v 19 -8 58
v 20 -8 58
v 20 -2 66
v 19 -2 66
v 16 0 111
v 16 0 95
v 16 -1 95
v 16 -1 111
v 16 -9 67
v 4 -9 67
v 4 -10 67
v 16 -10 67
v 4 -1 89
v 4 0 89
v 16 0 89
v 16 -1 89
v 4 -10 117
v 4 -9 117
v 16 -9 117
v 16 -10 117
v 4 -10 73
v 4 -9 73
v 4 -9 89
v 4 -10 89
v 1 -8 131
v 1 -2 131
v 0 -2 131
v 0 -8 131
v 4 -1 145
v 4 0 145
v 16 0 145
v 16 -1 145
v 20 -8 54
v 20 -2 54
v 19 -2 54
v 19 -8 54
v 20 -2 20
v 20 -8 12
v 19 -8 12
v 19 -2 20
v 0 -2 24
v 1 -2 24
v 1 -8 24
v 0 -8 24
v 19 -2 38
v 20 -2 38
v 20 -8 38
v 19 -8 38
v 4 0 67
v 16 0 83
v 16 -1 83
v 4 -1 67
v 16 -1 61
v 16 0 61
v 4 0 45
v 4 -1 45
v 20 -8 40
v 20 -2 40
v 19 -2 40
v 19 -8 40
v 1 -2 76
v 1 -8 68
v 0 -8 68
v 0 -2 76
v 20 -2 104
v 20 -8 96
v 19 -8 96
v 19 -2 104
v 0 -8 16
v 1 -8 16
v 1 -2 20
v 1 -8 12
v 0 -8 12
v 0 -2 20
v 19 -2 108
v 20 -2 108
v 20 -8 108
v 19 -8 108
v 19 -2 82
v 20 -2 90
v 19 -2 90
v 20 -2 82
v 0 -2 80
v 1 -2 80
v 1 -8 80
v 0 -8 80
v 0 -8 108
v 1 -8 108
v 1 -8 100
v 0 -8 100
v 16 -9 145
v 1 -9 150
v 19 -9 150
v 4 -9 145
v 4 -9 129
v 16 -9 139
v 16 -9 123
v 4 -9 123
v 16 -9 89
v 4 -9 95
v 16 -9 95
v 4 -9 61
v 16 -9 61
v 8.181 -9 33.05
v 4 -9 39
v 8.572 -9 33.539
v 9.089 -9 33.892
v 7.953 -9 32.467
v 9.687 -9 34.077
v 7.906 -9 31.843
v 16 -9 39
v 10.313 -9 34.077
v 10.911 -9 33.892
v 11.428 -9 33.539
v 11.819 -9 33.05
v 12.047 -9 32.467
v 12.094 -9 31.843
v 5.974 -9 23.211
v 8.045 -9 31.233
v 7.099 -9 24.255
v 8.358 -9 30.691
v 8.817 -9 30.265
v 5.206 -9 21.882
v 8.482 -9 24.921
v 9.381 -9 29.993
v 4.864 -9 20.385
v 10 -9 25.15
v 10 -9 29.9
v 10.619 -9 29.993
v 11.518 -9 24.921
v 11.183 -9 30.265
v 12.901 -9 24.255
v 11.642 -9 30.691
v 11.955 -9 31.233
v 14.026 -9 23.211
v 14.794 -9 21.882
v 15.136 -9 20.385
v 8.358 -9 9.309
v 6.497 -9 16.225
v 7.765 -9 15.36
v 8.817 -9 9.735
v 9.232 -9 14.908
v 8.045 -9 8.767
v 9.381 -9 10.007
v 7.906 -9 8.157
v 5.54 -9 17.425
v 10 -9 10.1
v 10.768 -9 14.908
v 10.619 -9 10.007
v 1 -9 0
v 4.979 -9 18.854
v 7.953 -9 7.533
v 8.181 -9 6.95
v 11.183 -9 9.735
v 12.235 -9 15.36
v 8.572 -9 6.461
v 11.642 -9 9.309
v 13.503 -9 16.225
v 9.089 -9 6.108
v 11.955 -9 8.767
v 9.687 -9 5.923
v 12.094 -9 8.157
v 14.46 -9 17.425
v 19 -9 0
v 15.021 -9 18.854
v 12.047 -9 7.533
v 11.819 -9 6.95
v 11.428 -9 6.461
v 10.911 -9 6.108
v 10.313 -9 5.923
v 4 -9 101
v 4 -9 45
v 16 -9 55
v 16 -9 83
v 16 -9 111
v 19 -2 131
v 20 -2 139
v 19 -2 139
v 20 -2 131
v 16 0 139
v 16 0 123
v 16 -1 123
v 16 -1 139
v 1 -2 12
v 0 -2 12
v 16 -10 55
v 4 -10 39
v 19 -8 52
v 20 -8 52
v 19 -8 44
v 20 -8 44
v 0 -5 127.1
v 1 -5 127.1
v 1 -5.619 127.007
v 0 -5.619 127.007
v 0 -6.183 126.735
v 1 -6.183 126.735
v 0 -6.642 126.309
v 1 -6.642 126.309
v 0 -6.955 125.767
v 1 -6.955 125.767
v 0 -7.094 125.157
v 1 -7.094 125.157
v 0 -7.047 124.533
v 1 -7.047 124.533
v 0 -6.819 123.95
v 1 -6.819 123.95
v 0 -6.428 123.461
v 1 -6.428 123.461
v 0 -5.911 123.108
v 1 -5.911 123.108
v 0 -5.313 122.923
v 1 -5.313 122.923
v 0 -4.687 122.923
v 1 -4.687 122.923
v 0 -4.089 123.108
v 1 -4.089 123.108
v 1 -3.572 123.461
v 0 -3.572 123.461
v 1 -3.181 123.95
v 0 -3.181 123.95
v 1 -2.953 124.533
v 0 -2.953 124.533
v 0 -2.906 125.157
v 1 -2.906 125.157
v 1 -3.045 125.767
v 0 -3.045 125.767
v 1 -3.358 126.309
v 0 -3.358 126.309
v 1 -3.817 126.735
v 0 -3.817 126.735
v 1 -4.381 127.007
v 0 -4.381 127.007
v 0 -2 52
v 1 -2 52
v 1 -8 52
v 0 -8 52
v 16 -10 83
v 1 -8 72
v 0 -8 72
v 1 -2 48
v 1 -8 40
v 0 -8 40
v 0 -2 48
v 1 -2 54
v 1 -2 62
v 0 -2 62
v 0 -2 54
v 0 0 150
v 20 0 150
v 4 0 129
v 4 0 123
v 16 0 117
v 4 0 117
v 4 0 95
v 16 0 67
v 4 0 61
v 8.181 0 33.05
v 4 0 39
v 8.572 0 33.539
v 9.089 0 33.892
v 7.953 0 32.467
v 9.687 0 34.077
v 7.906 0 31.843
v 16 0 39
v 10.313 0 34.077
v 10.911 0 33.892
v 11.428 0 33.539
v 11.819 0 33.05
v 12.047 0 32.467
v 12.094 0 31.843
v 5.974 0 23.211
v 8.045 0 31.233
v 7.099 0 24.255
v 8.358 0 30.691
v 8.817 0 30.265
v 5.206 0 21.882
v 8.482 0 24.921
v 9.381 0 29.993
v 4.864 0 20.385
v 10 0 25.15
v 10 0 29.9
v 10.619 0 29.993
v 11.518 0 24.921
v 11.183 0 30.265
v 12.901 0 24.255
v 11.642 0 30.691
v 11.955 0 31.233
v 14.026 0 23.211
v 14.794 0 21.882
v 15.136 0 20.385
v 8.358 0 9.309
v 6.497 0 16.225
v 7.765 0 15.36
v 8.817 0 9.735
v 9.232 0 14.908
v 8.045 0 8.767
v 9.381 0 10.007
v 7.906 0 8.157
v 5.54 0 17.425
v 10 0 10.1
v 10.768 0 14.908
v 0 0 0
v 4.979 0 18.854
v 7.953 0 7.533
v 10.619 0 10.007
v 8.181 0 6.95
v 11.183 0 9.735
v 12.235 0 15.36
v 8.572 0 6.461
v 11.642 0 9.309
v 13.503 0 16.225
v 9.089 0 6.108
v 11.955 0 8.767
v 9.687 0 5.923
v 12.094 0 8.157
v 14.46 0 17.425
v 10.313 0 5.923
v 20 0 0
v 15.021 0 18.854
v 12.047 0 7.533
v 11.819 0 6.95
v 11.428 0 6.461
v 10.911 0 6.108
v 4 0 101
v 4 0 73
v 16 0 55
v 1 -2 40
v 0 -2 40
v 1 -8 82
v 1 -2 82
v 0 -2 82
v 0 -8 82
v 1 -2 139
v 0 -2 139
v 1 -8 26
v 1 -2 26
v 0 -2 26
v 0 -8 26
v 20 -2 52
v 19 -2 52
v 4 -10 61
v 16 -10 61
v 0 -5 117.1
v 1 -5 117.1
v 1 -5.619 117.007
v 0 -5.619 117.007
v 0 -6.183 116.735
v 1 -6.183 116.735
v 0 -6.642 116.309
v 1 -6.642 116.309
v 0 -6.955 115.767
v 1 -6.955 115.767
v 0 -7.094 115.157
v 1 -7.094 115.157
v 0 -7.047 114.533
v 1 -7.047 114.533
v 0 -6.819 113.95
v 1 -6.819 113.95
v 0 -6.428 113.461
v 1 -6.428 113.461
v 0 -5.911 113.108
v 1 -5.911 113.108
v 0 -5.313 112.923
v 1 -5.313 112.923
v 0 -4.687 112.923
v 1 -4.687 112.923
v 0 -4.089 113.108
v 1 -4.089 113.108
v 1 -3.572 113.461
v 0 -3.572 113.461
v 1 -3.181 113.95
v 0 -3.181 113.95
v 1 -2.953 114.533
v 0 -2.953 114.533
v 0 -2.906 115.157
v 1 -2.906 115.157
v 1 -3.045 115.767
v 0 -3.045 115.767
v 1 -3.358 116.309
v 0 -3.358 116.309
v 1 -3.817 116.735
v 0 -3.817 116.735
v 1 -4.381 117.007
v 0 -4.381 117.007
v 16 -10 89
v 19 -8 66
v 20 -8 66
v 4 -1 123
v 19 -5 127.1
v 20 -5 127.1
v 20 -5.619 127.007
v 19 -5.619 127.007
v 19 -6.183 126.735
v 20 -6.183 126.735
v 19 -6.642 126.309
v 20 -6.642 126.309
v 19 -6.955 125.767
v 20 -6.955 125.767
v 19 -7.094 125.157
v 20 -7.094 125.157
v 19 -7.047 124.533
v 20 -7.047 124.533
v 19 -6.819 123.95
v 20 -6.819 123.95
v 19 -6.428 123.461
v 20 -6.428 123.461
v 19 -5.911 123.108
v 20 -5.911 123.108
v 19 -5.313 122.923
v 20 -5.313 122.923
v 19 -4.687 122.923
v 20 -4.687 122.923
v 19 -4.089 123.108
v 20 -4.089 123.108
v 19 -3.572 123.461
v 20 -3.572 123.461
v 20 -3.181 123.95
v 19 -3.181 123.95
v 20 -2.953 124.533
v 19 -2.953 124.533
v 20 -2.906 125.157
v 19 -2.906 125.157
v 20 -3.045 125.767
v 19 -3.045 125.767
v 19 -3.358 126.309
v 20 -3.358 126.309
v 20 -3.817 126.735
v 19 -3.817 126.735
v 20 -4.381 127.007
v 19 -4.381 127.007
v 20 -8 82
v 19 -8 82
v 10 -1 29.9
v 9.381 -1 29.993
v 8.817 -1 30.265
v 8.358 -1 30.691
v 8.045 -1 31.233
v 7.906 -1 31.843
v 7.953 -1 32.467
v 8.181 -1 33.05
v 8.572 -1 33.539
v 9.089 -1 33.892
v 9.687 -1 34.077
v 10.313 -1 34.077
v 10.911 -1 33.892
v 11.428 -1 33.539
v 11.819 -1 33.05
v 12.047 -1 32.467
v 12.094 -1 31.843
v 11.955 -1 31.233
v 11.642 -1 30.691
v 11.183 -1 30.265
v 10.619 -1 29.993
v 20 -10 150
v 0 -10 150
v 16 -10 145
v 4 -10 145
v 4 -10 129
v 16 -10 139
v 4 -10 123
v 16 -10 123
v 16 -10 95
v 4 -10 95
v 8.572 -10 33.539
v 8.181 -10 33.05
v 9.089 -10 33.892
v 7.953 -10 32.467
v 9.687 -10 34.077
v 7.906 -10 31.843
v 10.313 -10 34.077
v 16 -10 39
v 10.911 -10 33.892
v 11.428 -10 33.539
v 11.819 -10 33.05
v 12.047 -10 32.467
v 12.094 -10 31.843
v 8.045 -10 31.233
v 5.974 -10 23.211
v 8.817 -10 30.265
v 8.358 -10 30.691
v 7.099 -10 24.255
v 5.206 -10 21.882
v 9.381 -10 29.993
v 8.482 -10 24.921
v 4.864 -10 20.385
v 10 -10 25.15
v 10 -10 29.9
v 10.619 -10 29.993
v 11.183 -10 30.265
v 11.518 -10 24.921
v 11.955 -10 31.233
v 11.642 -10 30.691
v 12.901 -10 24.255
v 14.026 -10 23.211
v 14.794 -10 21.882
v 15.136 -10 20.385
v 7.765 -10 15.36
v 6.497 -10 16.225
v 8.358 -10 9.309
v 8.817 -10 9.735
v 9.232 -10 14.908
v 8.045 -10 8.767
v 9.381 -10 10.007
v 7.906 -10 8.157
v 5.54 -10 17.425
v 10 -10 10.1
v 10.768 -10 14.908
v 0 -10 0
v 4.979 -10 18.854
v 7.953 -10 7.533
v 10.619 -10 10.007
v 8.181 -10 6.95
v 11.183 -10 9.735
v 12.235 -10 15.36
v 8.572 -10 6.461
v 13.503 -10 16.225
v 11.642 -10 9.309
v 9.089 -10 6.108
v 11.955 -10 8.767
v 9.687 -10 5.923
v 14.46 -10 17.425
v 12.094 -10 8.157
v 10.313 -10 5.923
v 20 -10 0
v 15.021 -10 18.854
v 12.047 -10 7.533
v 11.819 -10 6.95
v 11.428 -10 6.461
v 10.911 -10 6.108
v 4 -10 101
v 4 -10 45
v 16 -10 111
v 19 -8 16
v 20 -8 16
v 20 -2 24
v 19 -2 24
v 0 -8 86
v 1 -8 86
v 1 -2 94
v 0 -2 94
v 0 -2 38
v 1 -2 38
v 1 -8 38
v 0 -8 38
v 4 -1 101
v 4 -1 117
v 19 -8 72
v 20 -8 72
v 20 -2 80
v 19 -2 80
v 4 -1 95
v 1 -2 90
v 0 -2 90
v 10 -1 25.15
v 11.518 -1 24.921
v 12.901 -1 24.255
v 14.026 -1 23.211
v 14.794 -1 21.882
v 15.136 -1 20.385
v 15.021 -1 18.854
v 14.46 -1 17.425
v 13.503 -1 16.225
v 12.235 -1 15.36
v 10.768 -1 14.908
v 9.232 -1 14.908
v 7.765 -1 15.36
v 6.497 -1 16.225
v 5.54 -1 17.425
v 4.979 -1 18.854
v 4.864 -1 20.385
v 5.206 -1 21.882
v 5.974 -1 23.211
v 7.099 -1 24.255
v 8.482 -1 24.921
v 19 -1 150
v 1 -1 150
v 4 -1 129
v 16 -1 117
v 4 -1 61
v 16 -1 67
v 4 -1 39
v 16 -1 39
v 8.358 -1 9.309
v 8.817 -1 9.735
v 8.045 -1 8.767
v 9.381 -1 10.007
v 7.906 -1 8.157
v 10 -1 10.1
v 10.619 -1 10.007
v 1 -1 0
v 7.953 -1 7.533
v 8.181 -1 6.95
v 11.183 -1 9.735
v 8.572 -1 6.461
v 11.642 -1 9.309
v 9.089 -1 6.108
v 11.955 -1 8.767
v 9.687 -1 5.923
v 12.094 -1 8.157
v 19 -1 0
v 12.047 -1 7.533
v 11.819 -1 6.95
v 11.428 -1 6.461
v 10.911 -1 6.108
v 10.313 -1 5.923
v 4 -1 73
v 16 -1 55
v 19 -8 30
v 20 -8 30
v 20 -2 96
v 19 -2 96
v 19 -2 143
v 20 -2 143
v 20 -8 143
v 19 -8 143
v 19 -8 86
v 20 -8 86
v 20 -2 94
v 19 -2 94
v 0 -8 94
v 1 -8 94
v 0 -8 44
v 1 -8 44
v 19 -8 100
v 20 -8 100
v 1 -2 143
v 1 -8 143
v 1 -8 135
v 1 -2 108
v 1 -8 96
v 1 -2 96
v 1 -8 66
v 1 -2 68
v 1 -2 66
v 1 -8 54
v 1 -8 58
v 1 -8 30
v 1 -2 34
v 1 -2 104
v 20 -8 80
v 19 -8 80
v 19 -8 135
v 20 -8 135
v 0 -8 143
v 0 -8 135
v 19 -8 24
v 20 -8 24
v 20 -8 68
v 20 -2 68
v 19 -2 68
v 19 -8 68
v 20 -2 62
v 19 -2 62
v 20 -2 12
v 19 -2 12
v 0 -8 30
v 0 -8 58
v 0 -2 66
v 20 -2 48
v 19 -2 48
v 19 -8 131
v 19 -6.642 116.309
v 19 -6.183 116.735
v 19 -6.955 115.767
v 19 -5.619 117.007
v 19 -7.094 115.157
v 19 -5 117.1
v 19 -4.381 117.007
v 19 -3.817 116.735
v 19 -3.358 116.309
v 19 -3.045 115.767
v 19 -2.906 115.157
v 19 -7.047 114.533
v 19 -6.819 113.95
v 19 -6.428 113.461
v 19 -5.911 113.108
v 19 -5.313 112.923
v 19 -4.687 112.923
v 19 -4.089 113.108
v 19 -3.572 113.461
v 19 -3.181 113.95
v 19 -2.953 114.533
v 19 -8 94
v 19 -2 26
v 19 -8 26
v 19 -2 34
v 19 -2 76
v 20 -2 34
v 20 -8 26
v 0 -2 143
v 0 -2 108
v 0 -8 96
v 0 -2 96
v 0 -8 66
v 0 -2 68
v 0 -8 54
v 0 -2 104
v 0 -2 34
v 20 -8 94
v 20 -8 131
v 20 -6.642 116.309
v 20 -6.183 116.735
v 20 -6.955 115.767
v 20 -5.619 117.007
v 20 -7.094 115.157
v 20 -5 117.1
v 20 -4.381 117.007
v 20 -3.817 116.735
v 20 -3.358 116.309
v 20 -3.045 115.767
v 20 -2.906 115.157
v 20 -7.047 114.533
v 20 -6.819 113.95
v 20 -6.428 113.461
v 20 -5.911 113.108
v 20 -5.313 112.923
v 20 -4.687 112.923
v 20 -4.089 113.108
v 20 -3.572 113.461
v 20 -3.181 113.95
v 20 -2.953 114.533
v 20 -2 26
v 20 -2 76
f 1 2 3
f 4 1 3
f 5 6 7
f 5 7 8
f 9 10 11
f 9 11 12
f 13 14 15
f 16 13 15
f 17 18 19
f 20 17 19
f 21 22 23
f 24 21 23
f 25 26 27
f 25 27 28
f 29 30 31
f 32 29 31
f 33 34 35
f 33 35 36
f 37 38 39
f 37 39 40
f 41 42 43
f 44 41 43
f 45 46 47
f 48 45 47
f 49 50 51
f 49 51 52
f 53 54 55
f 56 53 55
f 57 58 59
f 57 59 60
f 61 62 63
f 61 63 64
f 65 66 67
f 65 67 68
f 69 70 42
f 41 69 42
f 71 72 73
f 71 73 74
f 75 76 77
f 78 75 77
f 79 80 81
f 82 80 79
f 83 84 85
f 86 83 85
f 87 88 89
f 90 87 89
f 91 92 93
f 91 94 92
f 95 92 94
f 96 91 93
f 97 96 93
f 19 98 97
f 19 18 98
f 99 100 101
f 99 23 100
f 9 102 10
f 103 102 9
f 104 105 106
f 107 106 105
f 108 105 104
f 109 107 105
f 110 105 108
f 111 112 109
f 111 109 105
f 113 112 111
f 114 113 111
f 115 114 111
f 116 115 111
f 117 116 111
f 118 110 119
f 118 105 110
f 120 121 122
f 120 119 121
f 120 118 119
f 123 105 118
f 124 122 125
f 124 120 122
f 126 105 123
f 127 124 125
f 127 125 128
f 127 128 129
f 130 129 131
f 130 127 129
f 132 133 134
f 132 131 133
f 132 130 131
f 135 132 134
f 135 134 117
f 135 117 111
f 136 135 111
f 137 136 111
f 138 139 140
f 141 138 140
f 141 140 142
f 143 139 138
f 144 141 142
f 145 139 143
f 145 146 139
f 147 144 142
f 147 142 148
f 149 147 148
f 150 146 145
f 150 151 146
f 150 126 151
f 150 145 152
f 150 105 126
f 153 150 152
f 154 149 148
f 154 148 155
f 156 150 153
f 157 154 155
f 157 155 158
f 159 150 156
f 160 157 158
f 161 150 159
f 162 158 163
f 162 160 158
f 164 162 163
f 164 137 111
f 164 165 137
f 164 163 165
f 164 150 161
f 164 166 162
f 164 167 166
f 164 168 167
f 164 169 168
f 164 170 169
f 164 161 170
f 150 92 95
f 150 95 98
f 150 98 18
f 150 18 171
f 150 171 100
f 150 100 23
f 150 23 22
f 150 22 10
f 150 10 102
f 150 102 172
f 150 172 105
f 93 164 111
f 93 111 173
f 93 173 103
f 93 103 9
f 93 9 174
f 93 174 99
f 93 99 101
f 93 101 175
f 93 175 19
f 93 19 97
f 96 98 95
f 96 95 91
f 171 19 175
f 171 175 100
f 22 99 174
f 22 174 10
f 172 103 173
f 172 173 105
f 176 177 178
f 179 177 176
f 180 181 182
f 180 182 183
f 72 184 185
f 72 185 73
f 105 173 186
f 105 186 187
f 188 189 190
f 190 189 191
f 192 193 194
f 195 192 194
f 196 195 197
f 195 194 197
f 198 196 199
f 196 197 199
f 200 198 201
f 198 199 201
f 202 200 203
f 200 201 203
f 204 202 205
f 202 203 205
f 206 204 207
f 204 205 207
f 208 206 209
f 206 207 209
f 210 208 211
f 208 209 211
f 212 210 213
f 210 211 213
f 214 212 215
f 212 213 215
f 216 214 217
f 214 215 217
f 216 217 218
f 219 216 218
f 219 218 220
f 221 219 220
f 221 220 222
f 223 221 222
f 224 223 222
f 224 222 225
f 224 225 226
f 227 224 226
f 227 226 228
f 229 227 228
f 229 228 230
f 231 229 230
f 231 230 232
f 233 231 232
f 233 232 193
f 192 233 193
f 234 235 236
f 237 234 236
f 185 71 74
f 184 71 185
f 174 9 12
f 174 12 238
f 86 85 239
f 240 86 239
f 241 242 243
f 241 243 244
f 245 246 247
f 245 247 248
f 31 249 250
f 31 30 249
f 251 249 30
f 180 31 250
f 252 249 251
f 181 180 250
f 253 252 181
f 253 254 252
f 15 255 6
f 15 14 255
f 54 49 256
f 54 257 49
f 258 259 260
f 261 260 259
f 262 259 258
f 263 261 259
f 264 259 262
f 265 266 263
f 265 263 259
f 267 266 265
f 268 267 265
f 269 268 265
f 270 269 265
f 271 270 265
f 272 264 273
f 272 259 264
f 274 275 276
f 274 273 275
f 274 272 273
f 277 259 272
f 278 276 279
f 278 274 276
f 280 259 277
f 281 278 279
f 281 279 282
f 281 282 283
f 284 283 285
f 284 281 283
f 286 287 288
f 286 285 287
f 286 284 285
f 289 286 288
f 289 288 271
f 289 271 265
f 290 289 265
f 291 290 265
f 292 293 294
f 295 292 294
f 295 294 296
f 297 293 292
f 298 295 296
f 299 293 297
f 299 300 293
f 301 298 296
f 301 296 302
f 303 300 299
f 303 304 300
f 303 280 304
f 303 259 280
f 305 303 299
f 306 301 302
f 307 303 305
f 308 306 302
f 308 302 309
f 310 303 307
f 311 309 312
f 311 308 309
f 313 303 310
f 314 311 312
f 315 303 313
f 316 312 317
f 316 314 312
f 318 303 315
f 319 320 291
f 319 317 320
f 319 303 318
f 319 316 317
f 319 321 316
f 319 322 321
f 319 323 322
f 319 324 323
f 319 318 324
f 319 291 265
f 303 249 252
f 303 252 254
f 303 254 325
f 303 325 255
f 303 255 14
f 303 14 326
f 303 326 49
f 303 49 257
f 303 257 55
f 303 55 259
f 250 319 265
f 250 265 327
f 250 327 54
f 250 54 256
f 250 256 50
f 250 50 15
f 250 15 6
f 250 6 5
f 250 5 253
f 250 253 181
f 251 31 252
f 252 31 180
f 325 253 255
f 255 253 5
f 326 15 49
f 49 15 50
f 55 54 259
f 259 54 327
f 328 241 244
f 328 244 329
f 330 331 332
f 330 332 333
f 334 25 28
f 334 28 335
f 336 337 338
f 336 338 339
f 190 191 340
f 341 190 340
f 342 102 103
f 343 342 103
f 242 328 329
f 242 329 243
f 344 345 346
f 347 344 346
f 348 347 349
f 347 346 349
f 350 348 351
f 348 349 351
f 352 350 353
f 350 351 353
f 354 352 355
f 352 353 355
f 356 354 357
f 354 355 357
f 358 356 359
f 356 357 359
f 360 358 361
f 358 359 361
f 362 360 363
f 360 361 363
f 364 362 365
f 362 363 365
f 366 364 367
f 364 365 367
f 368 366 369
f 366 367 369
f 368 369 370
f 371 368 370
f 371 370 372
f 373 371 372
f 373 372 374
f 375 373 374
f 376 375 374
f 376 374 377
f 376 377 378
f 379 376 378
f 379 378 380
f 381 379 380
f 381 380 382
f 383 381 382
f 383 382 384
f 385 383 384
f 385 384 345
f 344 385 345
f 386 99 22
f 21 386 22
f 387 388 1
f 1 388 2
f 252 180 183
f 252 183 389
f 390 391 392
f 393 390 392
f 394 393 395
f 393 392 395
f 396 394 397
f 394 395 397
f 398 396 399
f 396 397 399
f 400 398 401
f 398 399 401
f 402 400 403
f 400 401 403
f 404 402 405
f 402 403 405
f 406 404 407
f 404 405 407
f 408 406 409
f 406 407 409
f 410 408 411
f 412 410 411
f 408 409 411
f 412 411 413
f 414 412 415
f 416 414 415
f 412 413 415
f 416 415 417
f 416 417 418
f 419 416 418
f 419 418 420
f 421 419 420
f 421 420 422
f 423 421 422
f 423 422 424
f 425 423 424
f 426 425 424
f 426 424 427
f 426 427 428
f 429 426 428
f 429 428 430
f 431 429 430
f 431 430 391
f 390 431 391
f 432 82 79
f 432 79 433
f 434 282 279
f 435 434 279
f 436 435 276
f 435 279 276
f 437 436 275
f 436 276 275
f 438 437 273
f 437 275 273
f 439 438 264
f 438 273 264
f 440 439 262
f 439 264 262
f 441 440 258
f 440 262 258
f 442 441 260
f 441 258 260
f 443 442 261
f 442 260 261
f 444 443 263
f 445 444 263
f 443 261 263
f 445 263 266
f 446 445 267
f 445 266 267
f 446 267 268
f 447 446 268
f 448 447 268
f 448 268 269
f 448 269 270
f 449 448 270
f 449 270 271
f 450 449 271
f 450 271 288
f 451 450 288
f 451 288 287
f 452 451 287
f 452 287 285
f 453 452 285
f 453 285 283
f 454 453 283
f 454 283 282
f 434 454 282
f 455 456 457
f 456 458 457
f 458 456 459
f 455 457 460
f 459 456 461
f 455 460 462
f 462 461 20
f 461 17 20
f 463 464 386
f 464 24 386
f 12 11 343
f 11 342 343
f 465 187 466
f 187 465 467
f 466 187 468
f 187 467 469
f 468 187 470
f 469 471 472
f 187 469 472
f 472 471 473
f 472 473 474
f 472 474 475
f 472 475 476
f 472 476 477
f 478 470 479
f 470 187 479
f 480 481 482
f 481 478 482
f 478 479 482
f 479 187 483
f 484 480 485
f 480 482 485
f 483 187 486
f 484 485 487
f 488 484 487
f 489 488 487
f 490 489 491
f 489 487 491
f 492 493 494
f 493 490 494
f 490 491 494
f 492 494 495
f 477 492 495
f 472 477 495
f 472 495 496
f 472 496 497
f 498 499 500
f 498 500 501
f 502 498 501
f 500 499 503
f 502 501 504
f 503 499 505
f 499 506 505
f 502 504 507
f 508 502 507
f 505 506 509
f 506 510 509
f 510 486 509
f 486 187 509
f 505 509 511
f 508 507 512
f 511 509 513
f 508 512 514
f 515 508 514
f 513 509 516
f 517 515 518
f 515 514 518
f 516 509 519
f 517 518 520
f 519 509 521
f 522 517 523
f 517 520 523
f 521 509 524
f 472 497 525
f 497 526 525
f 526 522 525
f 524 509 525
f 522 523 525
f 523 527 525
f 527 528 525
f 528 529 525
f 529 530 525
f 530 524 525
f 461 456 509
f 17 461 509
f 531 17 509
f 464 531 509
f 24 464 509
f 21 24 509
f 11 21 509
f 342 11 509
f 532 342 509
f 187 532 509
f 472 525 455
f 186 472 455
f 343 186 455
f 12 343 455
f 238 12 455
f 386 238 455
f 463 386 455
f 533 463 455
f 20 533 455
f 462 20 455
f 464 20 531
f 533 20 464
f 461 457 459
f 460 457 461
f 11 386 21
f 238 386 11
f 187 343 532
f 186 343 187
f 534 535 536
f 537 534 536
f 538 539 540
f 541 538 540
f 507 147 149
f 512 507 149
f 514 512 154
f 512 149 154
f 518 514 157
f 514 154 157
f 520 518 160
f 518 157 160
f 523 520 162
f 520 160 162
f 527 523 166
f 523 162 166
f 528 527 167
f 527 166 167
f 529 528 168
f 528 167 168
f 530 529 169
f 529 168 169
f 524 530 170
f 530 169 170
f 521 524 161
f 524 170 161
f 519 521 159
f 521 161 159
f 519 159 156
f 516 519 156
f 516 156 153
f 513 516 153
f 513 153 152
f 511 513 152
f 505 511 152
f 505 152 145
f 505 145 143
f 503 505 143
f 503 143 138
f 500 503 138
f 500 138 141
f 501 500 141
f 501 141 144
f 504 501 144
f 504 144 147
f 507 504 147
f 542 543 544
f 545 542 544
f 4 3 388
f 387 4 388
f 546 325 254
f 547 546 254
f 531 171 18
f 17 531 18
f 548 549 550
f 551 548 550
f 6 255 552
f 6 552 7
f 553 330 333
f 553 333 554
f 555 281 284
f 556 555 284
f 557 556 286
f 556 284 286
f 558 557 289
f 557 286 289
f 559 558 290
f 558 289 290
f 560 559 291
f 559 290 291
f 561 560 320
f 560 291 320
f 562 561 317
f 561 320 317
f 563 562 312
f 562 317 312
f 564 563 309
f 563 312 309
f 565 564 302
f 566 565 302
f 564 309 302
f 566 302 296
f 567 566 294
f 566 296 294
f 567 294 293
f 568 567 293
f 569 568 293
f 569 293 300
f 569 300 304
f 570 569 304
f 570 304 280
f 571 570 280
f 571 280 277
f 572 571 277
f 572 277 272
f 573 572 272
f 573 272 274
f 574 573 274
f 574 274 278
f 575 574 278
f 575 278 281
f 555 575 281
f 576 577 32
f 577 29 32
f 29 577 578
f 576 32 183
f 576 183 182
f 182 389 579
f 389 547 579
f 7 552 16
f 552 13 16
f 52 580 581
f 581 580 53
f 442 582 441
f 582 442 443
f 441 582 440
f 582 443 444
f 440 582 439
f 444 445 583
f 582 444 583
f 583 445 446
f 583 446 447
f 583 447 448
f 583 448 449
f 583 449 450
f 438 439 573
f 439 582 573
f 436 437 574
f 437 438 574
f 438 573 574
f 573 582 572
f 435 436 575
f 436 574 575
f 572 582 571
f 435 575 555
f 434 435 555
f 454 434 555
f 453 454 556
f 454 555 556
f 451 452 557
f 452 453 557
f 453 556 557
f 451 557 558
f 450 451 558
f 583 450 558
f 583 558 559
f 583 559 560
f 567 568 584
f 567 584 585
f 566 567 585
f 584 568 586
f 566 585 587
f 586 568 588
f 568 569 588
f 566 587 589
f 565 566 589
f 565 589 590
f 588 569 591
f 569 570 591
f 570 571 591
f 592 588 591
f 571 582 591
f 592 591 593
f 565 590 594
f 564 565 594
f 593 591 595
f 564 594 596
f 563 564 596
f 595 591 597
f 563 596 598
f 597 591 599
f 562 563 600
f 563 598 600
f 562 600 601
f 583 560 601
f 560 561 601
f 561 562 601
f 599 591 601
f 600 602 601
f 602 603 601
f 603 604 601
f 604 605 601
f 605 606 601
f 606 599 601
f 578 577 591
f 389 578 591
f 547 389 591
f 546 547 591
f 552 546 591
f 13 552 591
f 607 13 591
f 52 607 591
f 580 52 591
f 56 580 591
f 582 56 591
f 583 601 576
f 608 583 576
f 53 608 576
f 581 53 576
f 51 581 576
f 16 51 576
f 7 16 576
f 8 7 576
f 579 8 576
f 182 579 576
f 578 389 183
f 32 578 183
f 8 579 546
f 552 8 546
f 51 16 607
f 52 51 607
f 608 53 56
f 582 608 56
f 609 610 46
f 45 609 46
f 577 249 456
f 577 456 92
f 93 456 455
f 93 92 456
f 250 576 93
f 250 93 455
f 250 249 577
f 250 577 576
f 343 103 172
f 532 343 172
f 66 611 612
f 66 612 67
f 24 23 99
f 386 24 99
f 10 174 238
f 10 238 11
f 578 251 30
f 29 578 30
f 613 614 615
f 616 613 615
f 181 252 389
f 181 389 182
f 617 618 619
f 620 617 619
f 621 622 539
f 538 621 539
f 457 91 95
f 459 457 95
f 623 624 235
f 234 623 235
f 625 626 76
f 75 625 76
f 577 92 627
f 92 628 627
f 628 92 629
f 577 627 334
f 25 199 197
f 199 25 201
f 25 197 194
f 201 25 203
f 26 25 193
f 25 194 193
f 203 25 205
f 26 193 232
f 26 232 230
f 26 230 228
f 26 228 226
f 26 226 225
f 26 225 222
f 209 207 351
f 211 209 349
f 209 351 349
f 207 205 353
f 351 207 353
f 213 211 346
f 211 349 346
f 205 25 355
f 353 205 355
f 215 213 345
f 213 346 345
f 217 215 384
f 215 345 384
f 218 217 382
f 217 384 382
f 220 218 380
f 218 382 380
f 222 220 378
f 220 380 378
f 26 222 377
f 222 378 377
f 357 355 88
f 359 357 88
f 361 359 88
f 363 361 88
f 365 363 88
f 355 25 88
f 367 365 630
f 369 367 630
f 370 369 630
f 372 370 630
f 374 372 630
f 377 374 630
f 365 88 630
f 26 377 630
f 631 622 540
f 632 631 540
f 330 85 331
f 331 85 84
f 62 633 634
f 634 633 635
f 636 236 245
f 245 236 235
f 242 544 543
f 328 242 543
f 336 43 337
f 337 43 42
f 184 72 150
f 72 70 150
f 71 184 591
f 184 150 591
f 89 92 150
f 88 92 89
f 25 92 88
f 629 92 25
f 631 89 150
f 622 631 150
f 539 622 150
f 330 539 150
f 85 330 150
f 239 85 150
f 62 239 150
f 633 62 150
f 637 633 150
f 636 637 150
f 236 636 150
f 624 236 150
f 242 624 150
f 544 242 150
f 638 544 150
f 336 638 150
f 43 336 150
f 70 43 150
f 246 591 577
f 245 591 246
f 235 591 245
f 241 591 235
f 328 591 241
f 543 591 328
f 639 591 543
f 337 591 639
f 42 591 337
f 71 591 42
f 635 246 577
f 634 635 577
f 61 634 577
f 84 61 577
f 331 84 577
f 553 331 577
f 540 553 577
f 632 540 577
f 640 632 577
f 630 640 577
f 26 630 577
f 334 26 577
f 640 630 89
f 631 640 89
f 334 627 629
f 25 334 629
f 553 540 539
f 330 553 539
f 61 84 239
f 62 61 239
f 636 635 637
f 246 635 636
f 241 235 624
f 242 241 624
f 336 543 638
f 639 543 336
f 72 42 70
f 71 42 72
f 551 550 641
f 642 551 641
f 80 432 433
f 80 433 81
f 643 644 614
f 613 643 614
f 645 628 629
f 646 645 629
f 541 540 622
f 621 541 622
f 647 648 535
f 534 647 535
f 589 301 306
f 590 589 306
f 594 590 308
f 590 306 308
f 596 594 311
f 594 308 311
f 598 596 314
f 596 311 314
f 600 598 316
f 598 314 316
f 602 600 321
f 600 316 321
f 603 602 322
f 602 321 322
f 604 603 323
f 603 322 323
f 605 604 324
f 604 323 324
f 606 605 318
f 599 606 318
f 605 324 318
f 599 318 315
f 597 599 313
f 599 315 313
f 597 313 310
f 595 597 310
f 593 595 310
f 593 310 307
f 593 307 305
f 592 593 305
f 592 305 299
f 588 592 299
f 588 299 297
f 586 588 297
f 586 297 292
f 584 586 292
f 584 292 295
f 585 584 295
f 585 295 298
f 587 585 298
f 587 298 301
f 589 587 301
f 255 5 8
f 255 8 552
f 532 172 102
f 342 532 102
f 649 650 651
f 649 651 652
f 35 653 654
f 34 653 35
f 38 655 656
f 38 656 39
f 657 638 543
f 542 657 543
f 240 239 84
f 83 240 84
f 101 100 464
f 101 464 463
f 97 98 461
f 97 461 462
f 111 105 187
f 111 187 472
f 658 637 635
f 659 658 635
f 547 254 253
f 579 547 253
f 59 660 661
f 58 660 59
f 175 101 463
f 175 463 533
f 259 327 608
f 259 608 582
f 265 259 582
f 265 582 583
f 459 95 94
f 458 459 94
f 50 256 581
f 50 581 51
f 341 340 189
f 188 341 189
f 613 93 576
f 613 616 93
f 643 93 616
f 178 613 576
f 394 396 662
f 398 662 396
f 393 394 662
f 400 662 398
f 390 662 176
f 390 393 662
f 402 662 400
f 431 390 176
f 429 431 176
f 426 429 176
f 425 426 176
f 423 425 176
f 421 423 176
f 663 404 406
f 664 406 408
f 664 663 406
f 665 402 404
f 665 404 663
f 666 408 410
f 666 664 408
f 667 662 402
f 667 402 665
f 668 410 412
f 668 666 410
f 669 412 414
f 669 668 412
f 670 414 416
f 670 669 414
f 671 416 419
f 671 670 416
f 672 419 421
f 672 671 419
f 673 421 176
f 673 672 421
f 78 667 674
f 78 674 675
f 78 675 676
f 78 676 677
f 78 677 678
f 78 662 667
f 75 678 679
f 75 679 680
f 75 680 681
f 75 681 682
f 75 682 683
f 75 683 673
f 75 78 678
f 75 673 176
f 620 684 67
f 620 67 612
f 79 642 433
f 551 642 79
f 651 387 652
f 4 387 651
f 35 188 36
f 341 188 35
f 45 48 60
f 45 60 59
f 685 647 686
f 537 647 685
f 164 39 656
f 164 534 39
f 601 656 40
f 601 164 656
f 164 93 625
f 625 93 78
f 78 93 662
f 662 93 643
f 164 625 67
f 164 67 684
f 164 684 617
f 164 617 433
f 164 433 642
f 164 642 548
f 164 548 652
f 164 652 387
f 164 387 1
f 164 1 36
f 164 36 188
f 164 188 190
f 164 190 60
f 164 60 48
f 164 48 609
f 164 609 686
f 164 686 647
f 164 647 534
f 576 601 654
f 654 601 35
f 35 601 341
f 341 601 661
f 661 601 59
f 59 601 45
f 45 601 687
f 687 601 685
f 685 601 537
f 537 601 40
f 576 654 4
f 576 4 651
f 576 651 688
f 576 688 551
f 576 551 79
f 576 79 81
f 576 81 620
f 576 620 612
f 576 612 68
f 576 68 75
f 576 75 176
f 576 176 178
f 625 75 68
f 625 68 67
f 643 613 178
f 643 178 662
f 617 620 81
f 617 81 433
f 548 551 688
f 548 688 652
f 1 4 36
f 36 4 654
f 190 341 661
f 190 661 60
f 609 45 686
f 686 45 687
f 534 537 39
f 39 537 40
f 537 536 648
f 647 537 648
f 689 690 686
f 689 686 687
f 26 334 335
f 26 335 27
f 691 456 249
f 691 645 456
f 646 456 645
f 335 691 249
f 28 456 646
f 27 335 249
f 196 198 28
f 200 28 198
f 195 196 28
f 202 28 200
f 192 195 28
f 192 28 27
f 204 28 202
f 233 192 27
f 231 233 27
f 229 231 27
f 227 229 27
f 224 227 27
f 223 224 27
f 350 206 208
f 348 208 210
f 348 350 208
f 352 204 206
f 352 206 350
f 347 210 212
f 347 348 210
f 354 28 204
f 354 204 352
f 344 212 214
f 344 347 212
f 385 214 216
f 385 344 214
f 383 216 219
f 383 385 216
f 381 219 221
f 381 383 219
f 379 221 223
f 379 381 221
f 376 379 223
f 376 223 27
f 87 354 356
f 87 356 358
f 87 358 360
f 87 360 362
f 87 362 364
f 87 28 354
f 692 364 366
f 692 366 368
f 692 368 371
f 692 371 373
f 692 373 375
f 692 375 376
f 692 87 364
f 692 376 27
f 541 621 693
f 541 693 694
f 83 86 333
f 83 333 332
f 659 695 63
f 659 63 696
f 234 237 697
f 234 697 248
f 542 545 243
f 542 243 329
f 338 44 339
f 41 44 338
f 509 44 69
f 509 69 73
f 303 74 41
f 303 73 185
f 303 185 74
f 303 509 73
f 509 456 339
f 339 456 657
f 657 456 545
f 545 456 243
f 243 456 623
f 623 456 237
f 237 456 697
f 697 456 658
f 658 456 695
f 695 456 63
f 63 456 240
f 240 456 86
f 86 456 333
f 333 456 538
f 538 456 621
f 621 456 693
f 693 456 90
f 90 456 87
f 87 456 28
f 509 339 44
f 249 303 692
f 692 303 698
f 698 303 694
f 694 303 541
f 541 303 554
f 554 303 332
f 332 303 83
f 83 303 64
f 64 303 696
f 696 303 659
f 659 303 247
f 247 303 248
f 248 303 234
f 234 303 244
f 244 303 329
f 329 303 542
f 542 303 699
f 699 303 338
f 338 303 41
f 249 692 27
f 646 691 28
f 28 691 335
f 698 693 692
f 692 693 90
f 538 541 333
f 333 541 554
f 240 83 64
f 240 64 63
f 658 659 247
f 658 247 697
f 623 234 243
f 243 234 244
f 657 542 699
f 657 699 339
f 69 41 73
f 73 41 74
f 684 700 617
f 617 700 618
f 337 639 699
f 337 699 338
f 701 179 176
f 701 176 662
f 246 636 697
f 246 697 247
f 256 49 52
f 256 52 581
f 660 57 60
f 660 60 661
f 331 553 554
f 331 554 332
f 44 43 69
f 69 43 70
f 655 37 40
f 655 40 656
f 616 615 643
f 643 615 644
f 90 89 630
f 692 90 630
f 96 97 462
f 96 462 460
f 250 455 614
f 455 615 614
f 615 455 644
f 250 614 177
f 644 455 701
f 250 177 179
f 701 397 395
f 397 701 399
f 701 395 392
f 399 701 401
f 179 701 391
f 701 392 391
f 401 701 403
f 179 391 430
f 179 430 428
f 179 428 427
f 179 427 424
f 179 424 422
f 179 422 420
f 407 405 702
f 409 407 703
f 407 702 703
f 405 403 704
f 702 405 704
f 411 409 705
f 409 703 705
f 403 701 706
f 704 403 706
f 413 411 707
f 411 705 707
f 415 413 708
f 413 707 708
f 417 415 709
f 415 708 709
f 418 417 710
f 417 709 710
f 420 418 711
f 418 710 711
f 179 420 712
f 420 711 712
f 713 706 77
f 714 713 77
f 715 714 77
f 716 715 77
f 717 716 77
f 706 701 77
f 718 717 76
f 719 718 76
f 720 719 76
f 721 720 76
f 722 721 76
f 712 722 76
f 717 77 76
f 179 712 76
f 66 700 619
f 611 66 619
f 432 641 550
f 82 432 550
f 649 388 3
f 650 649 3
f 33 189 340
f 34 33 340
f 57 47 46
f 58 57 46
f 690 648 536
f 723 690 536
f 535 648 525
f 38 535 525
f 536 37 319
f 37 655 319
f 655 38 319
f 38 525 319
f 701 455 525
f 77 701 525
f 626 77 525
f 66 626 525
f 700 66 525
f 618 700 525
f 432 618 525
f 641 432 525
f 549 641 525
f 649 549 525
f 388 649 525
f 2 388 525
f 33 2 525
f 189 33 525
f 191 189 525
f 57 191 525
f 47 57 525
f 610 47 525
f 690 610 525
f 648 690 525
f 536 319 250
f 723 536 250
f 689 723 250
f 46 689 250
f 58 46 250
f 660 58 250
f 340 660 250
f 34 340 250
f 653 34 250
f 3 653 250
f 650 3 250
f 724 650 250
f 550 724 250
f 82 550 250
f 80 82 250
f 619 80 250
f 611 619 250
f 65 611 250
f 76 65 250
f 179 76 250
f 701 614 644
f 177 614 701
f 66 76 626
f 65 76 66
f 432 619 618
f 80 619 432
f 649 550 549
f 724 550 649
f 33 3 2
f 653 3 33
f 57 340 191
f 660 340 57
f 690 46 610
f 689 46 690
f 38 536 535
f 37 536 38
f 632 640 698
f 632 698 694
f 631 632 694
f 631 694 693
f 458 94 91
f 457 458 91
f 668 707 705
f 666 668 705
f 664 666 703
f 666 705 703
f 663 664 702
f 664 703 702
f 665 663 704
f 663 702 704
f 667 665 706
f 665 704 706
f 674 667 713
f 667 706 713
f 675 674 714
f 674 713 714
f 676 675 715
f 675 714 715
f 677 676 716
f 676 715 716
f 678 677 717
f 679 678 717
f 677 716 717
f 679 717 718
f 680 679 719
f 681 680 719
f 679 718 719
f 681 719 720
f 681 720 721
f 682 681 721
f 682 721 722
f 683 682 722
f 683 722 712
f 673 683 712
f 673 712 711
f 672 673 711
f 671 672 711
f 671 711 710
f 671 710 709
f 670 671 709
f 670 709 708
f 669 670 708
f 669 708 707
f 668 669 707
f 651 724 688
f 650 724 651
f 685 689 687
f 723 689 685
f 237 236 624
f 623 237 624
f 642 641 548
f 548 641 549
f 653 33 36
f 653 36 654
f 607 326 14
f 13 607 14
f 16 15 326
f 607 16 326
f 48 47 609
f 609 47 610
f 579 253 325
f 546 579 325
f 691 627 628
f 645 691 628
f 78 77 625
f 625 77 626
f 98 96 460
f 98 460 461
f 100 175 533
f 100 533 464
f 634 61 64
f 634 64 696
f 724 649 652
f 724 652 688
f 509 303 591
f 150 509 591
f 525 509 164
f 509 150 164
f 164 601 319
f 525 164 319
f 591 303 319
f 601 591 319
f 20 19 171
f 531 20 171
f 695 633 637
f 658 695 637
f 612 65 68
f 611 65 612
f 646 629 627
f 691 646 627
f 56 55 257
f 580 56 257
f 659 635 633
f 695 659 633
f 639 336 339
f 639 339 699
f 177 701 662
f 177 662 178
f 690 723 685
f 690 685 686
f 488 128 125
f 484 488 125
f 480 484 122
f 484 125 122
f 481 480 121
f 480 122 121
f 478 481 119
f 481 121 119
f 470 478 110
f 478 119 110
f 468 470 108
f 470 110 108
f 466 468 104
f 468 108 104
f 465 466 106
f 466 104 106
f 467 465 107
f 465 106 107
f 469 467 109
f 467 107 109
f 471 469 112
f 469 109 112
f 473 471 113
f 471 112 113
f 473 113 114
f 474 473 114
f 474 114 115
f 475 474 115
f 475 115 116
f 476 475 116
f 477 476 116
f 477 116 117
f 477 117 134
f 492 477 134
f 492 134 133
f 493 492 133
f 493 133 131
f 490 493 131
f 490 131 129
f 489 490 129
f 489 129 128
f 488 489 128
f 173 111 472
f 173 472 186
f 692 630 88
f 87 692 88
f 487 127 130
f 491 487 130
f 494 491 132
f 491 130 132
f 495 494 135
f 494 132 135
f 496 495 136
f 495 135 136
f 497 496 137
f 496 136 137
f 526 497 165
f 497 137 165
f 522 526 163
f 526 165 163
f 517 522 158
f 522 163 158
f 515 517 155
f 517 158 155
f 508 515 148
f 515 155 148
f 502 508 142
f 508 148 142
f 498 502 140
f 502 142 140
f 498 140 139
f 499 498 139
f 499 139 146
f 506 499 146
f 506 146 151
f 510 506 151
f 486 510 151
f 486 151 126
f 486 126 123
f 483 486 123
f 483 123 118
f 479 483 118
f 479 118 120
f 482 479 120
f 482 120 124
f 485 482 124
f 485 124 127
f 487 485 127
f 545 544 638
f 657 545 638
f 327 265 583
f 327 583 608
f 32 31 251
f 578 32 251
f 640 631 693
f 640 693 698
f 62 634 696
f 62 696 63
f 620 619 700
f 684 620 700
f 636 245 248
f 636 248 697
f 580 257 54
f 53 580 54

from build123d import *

# Parameters (mm, degrees)
SKETCH_1_W          = 20
SKETCH_1_H          = 10
SKETCH_1_W_2        = 18
SKETCH_1_H_2        = 8
EXTRUDE_1_DEPTH     = 150
SKETCH_2_R          = 2.1
CUT_EXTRUDE_1_DEPTH = 152.657508881
SKETCH_3_R          = 5.15
SKETCH_3_R_2        = 2.1
CUT_EXTRUDE_2_DEPTH = 152.657508881


with BuildPart() as part:
    # 草图1 → 拉伸-薄壁1 (new body)
    with BuildSketch(Plane.XY):
        with Locations((10, -5)):
            Rectangle(SKETCH_1_W, SKETCH_1_H)
        with Locations((10, -5)):
            Rectangle(SKETCH_1_W_2, SKETCH_1_H_2, mode=Mode.SUBTRACT)
    extrude(amount=EXTRUDE_1_DEPTH)

    # 草图2 → 切除-拉伸1 (cut, through all)
    with BuildSketch(Plane(origin=(20, 0, 0), x_dir=(0, 0, -1), z_dir=(1, 0, 0))):
        with Locations(Location((-115, -5, 0), (0, 0, 180))):
            Circle(SKETCH_2_R)
        with Locations(Location((-125, -5, 0), (0, 0, 180))):
            Circle(SKETCH_2_R)
        Polygon((-108, -2), (-108, -8), (-100, -8), align=None)
        Polygon((-104, -2), (-96, -2), (-96, -8), align=None)
        Polygon((-90, -2), (-82, -2), (-82, -8), align=None)
        Polygon((-86, -8), (-94, -2), (-94, -8), align=None)
        Polygon((-76, -2), (-68, -2), (-68, -8), align=None)
        Polygon((-72, -8), (-80, -2), (-80, -8), align=None)
        Polygon((-62, -2), (-54, -2), (-54, -8), align=None)
        Polygon((-58, -8), (-66, -2), (-66, -8), align=None)
        Polygon((-48, -2), (-40, -2), (-40, -8), align=None)
        Polygon((-44, -8), (-52, -2), (-52, -8), align=None)
        Polygon((-34, -2), (-26, -2), (-26, -8), align=None)
        Polygon((-30, -8), (-38, -2), (-38, -8), align=None)
        Polygon((-20, -2), (-12, -2), (-12, -8), align=None)
        Polygon((-16, -8), (-24, -2), (-24, -8), align=None)
        Polygon((-139, -2), (-131, -2), (-131, -8), align=None)
        Polygon((-135, -8), (-143, -2), (-143, -8), align=None)
    extrude(amount=-CUT_EXTRUDE_1_DEPTH, mode=Mode.SUBTRACT)

    # 草图3 → 切除-拉伸2 (cut, through all)
    with BuildSketch(Plane(origin=(0, 0, 0), x_dir=(1, 0, 0), z_dir=(0, 1, 0))):
        with Locations(Location((10, -20, 0), (0, 0, 270))):
            Circle(SKETCH_3_R)
        with Locations(Location((10, -8, 0), (0, 0, 270))):
            Circle(SKETCH_3_R_2)
        with Locations(Location((10, -32, 0), (0, 0, 90))):
            Circle(SKETCH_3_R_2)
        Polygon((4, -129), (4, -145), (16, -145), align=None)
        Polygon((4, -123), (16, -123), (16, -139), align=None)
        Polygon((4, -95), (16, -95), (16, -111), align=None)
        Polygon((16, -117), (4, -101), (4, -117), align=None)
        Polygon((4, -67), (16, -67), (16, -83), align=None)
        Polygon((16, -89), (4, -73), (4, -89), align=None)
        Polygon((4, -39), (16, -39), (16, -55), align=None)
        Polygon((16, -61), (4, -45), (4, -61), align=None)
    extrude(amount=-CUT_EXTRUDE_2_DEPTH, mode=Mode.SUBTRACT)


solid = part.part
